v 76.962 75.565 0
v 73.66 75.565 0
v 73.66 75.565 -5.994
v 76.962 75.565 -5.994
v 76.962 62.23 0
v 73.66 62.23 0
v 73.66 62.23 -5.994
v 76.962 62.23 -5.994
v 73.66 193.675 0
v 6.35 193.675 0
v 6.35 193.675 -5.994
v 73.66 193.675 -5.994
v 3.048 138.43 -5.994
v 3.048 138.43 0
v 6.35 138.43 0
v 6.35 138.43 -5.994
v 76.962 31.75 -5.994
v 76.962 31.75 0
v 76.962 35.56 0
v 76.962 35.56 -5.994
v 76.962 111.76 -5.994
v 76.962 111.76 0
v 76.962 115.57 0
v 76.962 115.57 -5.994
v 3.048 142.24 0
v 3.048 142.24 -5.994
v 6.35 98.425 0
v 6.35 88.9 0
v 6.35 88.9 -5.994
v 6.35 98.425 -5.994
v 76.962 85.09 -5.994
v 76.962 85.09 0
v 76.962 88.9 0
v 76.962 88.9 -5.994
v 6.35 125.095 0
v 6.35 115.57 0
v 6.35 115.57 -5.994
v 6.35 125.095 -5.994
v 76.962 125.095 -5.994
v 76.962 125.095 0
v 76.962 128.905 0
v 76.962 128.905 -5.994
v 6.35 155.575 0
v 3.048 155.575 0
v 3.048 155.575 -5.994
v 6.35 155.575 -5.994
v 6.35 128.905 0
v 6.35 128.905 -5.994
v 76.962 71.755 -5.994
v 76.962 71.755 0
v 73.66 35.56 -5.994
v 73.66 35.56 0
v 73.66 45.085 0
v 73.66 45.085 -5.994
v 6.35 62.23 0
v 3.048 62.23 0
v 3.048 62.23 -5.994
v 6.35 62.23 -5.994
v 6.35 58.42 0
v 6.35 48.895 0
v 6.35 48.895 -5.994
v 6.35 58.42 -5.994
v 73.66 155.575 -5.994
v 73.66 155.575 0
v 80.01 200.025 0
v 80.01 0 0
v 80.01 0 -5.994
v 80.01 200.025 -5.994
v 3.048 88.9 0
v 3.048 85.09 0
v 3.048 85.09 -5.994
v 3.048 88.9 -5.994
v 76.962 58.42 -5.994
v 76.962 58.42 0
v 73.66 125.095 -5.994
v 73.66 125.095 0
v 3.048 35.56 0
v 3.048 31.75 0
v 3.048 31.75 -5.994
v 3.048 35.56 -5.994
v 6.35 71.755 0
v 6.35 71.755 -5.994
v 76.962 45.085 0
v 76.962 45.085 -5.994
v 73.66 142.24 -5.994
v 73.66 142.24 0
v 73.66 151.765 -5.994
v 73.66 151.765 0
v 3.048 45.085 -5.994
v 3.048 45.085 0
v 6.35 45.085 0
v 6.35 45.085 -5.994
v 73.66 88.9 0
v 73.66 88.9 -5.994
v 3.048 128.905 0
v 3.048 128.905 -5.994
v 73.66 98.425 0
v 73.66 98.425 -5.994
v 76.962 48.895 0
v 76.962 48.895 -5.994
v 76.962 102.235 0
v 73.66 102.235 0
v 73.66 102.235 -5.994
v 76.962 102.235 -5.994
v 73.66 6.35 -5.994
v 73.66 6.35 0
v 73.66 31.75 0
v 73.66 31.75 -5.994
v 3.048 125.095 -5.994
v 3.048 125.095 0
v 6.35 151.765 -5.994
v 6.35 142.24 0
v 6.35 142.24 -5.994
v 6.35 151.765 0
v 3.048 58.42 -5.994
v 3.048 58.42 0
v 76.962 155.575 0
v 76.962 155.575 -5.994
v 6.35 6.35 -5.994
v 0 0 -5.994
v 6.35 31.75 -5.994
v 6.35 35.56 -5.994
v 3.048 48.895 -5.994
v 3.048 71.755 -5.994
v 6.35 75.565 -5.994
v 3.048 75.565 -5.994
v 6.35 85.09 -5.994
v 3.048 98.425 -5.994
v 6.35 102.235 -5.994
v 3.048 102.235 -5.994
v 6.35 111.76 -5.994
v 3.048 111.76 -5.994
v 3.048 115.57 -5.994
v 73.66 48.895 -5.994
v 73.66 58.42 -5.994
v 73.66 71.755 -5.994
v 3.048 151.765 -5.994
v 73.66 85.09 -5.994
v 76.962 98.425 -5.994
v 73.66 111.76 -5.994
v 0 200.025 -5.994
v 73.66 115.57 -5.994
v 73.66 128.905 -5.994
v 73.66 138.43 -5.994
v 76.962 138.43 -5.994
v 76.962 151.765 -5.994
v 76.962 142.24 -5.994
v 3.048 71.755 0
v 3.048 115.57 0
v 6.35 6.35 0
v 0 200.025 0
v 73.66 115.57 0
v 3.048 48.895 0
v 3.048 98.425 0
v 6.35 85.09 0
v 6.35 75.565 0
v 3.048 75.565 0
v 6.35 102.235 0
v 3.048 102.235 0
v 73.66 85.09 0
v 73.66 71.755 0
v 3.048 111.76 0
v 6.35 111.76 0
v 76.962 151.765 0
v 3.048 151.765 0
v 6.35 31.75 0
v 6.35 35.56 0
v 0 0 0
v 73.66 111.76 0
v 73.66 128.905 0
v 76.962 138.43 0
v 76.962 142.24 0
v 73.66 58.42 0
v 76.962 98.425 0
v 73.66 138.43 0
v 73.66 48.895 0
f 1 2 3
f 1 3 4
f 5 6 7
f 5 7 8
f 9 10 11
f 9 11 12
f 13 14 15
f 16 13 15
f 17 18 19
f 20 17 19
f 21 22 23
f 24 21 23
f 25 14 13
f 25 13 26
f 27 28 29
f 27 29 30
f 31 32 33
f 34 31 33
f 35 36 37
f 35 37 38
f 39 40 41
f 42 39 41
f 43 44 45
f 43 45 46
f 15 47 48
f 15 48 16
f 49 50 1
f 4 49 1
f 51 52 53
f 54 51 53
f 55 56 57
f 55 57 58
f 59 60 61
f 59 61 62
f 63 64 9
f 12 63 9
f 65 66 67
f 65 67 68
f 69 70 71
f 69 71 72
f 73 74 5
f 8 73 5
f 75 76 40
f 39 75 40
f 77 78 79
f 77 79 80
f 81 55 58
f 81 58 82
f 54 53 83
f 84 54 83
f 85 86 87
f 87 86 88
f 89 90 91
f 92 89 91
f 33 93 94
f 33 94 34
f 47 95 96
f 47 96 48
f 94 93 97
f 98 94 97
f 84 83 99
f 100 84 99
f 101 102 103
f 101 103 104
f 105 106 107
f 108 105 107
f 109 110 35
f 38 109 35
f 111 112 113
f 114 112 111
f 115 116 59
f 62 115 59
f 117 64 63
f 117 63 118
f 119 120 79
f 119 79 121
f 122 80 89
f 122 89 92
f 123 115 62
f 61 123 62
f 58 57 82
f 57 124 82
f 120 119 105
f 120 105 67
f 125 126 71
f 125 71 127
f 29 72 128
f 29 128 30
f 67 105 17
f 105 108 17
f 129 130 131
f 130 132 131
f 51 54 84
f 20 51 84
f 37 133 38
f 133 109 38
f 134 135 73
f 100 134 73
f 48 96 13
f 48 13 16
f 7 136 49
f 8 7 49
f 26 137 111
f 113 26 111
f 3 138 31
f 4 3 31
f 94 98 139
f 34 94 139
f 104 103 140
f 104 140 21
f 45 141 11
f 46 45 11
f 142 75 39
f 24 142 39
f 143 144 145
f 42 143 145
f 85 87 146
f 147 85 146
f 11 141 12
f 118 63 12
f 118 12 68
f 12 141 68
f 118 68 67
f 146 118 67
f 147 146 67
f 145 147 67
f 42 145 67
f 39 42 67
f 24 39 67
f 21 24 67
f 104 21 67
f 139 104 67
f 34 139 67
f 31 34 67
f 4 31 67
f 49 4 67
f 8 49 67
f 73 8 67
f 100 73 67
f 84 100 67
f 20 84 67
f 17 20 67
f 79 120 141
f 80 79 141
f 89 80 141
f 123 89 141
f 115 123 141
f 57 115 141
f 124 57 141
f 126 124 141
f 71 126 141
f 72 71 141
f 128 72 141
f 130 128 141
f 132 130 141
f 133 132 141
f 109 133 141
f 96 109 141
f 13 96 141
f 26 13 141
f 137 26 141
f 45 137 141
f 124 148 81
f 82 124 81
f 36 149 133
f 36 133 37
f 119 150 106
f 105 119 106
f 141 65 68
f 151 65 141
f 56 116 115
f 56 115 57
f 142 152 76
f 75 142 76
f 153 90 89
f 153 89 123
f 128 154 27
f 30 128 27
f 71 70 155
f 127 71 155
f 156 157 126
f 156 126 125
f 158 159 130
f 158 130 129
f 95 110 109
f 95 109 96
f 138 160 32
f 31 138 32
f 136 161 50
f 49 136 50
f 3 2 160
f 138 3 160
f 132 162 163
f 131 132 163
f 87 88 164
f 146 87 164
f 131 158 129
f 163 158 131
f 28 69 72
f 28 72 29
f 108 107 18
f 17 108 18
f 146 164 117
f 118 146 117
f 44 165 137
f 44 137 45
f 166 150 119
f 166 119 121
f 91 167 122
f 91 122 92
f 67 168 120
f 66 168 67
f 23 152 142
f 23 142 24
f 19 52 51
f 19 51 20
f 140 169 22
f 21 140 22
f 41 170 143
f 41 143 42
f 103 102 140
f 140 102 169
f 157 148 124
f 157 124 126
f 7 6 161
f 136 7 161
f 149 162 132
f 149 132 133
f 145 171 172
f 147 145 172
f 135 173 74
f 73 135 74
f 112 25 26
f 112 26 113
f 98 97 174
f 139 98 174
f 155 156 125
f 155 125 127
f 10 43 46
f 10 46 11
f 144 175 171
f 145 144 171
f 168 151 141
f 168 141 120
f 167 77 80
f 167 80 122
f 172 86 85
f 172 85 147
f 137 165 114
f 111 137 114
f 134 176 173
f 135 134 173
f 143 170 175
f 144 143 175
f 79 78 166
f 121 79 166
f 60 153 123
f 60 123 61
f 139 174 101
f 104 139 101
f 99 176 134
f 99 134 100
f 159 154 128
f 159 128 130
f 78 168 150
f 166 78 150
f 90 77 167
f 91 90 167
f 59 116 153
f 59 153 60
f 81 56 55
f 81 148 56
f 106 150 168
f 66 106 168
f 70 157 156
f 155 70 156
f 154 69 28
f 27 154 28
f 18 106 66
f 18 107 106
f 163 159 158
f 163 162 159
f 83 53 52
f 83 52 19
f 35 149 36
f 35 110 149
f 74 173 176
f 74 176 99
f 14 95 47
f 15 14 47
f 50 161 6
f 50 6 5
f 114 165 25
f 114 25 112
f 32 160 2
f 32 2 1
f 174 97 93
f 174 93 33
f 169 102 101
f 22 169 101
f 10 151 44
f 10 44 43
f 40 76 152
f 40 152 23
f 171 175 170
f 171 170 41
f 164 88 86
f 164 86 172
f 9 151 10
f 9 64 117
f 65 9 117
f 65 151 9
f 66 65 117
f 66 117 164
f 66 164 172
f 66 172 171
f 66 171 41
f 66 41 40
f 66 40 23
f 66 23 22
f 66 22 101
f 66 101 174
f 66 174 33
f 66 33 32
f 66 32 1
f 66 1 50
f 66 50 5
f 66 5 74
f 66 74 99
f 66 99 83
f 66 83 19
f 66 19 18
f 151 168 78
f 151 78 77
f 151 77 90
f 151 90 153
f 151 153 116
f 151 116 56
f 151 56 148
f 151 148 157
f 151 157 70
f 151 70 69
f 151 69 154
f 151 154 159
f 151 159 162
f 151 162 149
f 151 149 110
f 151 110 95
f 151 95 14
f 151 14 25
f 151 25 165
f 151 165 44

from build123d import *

# Parameters (mm, degrees)
SKETCH1_W           = 67.31
SKETCH1_H           = 187.325
BOSS_EXTRUDE1_DEPTH = 5.9944
SKETCH2_W           = 6.604
SKETCH2_H           = 3.81
CUT_EXTRUDE1_DEPTH  = 6.9944


with BuildPart() as part:
    # Sketch1 → Boss-Extrude1 (new body)
    with BuildSketch(Plane.XY):
        Polygon((0, 0), (6.35, 0), (73.66, 0), (80.01, 0), (80.01, 200.025), (73.66, 200.025), (6.35, 200.025), (0, 200.025), align=None)
        with Locations((40.005, 100.0125)):
            Rectangle(SKETCH1_W, SKETCH1_H, mode=Mode.SUBTRACT)
    extrude(amount=-BOSS_EXTRUDE1_DEPTH)

    # Sketch2 → Cut-Extrude1 (cut, through all)
    with BuildSketch(Plane.XY):
        with Locations((6.35, 33.655)):
            Rectangle(SKETCH2_W, SKETCH2_H)
        with Locations((6.35, 46.99)):
            Rectangle(SKETCH2_W, SKETCH2_H)
        with Locations((73.66, 33.655)):
            Rectangle(SKETCH2_W, SKETCH2_H)
        with Locations((73.66, 46.99)):
            Rectangle(SKETCH2_W, SKETCH2_H)
        with Locations((6.35, 60.325)):
            Rectangle(SKETCH2_W, SKETCH2_H)
        with Locations((73.66, 60.325)):
            Rectangle(SKETCH2_W, SKETCH2_H)
        with Locations((6.35, 73.66)):
            Rectangle(SKETCH2_W, SKETCH2_H)
        with Locations((73.66, 73.66)):
            Rectangle(SKETCH2_W, SKETCH2_H)
        with Locations((6.35, 86.995)):
            Rectangle(SKETCH2_W, SKETCH2_H)
        with Locations((73.66, 86.995)):
            Rectangle(SKETCH2_W, SKETCH2_H)
        with Locations((6.35, 100.33)):
            Rectangle(SKETCH2_W, SKETCH2_H)
        with Locations((73.66, 100.33)):
            Rectangle(SKETCH2_W, SKETCH2_H)
        with Locations((6.35, 113.665)):
            Rectangle(SKETCH2_W, SKETCH2_H)
        with Locations((73.66, 113.665)):
            Rectangle(SKETCH2_W, SKETCH2_H)
        with Locations((6.35, 127)):
            Rectangle(SKETCH2_W, SKETCH2_H)
        with Locations((73.66, 127)):
            Rectangle(SKETCH2_W, SKETCH2_H)
        with Locations((6.35, 140.335)):
            Rectangle(SKETCH2_W, SKETCH2_H)
        with Locations((73.66, 140.335)):
            Rectangle(SKETCH2_W, SKETCH2_H)
        with Locations((6.35, 153.67)):
            Rectangle(SKETCH2_W, SKETCH2_H)
        with Locations((73.66, 153.67)):
            Rectangle(SKETCH2_W, SKETCH2_H)
    extrude(amount=-CUT_EXTRUDE1_DEPTH, mode=Mode.SUBTRACT)


solid = part.part
